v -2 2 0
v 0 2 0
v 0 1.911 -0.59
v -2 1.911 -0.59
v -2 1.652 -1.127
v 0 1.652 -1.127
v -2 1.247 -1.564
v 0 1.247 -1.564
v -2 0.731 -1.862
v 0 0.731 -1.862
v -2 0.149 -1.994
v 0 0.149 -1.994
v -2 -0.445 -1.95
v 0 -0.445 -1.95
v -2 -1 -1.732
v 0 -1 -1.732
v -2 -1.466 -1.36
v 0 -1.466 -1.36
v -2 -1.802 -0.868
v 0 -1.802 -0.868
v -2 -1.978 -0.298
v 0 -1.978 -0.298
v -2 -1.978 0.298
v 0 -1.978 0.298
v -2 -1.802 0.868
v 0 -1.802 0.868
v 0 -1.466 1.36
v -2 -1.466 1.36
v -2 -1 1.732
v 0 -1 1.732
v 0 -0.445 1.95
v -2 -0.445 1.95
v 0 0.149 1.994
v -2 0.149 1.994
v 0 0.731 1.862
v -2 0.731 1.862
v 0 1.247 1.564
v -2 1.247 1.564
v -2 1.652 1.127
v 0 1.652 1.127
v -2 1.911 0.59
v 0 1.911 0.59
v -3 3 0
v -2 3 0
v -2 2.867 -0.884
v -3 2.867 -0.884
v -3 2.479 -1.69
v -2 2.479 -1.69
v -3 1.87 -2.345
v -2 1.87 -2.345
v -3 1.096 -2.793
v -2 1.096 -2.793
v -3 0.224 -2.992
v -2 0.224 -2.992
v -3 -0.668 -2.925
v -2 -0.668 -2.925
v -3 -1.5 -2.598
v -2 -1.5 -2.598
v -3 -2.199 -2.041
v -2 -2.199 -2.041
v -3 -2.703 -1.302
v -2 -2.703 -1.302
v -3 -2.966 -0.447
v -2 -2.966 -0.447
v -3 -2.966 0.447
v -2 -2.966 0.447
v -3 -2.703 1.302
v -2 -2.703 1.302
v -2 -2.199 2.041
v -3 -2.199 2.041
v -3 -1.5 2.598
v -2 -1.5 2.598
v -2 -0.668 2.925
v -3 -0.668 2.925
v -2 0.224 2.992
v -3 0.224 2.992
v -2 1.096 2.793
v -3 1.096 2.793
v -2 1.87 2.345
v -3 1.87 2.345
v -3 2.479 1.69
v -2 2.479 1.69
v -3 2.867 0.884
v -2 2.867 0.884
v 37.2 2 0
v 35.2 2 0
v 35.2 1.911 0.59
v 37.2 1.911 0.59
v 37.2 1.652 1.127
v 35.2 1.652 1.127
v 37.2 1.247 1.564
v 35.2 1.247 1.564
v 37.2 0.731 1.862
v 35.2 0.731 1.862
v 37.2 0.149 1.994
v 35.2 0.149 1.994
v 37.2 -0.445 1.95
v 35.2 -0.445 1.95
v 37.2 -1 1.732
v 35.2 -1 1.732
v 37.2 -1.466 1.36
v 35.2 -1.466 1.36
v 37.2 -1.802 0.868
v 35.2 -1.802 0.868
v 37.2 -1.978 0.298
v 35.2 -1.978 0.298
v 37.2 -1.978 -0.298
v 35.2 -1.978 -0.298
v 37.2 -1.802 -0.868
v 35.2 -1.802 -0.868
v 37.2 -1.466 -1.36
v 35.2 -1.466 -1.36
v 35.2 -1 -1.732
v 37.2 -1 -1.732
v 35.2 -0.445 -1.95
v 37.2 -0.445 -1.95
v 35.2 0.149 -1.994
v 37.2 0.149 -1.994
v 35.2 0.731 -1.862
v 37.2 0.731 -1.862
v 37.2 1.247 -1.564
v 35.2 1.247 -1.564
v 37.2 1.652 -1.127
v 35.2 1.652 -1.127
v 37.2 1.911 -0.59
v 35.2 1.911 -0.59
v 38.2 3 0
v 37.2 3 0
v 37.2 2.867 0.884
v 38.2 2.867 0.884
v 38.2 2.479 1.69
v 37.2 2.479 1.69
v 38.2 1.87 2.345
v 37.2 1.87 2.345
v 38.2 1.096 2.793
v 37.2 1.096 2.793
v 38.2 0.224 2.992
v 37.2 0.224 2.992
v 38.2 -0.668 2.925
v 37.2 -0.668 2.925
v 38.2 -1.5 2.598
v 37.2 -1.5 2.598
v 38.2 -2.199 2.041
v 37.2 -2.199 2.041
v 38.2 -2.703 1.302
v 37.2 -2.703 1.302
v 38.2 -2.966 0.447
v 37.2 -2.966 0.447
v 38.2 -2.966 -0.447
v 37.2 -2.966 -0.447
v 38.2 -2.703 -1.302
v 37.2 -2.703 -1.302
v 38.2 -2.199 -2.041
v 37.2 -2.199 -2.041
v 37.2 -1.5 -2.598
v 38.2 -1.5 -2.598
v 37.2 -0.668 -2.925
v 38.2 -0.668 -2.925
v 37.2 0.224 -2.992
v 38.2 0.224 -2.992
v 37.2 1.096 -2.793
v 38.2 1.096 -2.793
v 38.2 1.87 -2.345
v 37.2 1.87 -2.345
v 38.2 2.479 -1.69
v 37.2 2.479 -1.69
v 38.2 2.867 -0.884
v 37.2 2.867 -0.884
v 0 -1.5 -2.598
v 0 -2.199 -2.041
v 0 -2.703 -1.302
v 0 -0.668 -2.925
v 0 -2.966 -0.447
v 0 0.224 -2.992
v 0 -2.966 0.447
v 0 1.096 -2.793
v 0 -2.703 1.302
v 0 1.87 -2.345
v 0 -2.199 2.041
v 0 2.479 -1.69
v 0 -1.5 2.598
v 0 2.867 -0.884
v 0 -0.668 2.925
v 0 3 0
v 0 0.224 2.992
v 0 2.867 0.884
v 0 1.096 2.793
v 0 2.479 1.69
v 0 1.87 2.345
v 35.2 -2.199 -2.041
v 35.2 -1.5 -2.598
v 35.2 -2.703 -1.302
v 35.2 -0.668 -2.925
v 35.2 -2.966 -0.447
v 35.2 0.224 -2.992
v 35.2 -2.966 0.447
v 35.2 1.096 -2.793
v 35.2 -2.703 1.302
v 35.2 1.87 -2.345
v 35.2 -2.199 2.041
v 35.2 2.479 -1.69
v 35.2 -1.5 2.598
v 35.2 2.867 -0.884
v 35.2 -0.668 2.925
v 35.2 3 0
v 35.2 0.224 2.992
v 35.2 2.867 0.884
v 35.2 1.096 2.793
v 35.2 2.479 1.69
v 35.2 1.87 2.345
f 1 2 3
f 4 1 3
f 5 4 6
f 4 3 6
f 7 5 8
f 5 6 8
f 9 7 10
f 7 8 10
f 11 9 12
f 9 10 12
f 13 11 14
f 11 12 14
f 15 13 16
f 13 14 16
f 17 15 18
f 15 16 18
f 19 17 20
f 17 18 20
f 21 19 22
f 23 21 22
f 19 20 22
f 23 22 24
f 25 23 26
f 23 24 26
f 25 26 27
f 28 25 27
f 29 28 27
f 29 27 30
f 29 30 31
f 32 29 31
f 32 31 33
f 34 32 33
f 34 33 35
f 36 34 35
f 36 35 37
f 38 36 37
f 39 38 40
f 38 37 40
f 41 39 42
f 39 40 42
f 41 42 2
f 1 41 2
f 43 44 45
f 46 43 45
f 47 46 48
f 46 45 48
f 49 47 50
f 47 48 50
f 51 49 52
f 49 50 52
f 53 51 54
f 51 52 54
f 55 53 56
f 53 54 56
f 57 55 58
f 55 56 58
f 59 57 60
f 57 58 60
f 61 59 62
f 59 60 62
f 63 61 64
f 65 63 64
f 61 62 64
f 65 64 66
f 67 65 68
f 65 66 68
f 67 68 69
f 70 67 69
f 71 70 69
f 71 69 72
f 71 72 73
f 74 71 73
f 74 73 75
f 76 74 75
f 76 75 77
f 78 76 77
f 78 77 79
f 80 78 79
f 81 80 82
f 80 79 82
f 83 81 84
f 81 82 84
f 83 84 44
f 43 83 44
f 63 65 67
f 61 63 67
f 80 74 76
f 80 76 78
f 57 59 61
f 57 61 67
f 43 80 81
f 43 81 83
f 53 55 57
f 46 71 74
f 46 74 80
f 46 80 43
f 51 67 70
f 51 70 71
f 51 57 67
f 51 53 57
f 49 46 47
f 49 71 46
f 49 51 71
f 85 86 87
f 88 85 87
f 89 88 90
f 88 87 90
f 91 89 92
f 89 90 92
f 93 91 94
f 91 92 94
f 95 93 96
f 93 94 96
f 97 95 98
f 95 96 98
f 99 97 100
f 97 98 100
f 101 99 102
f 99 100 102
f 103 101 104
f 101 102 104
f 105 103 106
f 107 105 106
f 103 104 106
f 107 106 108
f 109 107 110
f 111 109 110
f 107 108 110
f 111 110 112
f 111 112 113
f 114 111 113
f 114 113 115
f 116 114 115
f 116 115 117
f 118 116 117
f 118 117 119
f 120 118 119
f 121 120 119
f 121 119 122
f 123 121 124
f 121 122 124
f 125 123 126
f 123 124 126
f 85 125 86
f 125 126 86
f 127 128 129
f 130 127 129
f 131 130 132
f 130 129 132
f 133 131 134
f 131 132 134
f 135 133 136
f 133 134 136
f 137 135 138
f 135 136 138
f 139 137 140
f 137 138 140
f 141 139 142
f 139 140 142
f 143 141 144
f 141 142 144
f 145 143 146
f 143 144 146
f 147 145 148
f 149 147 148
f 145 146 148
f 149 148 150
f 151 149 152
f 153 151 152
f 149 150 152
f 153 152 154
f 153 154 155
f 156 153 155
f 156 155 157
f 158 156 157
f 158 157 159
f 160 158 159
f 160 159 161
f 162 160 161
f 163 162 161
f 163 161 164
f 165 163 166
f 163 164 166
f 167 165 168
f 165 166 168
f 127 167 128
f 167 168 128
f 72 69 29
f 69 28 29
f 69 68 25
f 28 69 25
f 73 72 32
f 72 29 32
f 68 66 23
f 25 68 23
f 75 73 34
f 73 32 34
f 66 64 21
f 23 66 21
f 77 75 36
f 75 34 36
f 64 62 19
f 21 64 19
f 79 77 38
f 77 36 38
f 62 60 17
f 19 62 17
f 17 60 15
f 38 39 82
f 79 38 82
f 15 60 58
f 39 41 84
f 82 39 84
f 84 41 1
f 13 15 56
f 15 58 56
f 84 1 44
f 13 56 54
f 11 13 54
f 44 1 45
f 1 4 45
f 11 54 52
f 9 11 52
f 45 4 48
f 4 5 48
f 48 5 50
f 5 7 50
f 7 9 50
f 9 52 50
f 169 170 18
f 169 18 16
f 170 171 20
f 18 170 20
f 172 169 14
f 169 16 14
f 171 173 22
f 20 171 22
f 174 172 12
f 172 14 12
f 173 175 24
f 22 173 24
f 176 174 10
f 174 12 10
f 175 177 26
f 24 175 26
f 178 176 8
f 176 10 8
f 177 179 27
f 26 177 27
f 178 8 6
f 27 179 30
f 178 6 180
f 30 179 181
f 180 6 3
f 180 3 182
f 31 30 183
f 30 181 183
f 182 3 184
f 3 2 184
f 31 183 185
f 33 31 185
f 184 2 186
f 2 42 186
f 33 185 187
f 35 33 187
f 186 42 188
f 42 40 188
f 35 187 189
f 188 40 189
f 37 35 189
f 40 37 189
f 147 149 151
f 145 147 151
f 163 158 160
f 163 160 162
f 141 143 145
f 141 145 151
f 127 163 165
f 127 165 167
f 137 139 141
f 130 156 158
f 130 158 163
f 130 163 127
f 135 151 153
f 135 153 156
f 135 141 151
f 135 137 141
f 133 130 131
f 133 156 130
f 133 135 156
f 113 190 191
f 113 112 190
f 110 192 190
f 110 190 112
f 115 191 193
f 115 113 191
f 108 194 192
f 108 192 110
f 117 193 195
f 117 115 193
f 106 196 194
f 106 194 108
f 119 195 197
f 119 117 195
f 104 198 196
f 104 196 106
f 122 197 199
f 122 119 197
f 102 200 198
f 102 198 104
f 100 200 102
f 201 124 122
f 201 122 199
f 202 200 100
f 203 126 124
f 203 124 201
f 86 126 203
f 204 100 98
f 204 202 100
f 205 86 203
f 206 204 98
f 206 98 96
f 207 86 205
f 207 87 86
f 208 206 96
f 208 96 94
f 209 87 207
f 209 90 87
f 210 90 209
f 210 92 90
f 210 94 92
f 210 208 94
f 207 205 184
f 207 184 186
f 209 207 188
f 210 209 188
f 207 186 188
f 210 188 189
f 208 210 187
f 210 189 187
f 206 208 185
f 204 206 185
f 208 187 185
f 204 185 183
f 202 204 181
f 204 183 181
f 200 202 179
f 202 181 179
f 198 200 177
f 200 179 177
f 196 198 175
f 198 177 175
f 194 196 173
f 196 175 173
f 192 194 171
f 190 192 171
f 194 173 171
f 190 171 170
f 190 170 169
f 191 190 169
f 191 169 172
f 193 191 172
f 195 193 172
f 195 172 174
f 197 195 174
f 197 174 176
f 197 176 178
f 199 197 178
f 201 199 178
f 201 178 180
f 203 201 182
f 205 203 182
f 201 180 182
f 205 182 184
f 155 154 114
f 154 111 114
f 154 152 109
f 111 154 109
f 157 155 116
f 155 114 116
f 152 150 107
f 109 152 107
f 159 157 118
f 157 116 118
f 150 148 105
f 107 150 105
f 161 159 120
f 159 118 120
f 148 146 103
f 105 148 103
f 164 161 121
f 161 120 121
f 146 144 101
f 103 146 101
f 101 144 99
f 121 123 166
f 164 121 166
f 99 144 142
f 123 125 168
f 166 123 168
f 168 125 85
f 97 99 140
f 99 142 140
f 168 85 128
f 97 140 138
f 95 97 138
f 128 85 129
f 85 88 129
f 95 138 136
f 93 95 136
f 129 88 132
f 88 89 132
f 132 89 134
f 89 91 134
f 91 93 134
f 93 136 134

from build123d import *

# Parameters (mm, degrees)
SKETCH_R     = 3
PAD_DEPTH    = 35.2
SKETCH001_R  = 2
PAD001_DEPTH = 2
SKETCH002_R  = 3
PAD002_DEPTH = 1
SKETCH003_R  = 2
PAD003_DEPTH = 2
SKETCH004_R  = 3
PAD004_DEPTH = 1


with BuildPart() as part:
    # Sketch → Pad (new body)
    with BuildSketch(Plane.YZ):
        Circle(SKETCH_R)
    extrude(amount=PAD_DEPTH)

    # Sketch001 (on Face3 of Pad) → Pad001 (join)
    with BuildSketch(Plane.YZ.offset(35.2)):
        Circle(SKETCH001_R)
    extrude(amount=PAD001_DEPTH)

    # Sketch002 (on Face5 of Pad001) → Pad002 (join)
    with BuildSketch(Plane.YZ.offset(37.2)):
        Circle(SKETCH002_R)
    extrude(amount=PAD002_DEPTH)

    # Sketch003 (on Face7 of Pad002) → Pad003 (join)
    with BuildSketch(Plane(origin=(0, 0, 0), x_dir=(0, 1, 0), z_dir=(-1, 0, 0))):
        Circle(SKETCH003_R)
    extrude(amount=PAD003_DEPTH)

    # Sketch004 (on Face9 of Pad003) → Pad004 (join)
    with BuildSketch(Plane(origin=(-2, 0, 0), x_dir=(0, 1, 0), z_dir=(-1, 0, 0))):
        Circle(SKETCH004_R)
    extrude(amount=PAD004_DEPTH)


solid = part.part
